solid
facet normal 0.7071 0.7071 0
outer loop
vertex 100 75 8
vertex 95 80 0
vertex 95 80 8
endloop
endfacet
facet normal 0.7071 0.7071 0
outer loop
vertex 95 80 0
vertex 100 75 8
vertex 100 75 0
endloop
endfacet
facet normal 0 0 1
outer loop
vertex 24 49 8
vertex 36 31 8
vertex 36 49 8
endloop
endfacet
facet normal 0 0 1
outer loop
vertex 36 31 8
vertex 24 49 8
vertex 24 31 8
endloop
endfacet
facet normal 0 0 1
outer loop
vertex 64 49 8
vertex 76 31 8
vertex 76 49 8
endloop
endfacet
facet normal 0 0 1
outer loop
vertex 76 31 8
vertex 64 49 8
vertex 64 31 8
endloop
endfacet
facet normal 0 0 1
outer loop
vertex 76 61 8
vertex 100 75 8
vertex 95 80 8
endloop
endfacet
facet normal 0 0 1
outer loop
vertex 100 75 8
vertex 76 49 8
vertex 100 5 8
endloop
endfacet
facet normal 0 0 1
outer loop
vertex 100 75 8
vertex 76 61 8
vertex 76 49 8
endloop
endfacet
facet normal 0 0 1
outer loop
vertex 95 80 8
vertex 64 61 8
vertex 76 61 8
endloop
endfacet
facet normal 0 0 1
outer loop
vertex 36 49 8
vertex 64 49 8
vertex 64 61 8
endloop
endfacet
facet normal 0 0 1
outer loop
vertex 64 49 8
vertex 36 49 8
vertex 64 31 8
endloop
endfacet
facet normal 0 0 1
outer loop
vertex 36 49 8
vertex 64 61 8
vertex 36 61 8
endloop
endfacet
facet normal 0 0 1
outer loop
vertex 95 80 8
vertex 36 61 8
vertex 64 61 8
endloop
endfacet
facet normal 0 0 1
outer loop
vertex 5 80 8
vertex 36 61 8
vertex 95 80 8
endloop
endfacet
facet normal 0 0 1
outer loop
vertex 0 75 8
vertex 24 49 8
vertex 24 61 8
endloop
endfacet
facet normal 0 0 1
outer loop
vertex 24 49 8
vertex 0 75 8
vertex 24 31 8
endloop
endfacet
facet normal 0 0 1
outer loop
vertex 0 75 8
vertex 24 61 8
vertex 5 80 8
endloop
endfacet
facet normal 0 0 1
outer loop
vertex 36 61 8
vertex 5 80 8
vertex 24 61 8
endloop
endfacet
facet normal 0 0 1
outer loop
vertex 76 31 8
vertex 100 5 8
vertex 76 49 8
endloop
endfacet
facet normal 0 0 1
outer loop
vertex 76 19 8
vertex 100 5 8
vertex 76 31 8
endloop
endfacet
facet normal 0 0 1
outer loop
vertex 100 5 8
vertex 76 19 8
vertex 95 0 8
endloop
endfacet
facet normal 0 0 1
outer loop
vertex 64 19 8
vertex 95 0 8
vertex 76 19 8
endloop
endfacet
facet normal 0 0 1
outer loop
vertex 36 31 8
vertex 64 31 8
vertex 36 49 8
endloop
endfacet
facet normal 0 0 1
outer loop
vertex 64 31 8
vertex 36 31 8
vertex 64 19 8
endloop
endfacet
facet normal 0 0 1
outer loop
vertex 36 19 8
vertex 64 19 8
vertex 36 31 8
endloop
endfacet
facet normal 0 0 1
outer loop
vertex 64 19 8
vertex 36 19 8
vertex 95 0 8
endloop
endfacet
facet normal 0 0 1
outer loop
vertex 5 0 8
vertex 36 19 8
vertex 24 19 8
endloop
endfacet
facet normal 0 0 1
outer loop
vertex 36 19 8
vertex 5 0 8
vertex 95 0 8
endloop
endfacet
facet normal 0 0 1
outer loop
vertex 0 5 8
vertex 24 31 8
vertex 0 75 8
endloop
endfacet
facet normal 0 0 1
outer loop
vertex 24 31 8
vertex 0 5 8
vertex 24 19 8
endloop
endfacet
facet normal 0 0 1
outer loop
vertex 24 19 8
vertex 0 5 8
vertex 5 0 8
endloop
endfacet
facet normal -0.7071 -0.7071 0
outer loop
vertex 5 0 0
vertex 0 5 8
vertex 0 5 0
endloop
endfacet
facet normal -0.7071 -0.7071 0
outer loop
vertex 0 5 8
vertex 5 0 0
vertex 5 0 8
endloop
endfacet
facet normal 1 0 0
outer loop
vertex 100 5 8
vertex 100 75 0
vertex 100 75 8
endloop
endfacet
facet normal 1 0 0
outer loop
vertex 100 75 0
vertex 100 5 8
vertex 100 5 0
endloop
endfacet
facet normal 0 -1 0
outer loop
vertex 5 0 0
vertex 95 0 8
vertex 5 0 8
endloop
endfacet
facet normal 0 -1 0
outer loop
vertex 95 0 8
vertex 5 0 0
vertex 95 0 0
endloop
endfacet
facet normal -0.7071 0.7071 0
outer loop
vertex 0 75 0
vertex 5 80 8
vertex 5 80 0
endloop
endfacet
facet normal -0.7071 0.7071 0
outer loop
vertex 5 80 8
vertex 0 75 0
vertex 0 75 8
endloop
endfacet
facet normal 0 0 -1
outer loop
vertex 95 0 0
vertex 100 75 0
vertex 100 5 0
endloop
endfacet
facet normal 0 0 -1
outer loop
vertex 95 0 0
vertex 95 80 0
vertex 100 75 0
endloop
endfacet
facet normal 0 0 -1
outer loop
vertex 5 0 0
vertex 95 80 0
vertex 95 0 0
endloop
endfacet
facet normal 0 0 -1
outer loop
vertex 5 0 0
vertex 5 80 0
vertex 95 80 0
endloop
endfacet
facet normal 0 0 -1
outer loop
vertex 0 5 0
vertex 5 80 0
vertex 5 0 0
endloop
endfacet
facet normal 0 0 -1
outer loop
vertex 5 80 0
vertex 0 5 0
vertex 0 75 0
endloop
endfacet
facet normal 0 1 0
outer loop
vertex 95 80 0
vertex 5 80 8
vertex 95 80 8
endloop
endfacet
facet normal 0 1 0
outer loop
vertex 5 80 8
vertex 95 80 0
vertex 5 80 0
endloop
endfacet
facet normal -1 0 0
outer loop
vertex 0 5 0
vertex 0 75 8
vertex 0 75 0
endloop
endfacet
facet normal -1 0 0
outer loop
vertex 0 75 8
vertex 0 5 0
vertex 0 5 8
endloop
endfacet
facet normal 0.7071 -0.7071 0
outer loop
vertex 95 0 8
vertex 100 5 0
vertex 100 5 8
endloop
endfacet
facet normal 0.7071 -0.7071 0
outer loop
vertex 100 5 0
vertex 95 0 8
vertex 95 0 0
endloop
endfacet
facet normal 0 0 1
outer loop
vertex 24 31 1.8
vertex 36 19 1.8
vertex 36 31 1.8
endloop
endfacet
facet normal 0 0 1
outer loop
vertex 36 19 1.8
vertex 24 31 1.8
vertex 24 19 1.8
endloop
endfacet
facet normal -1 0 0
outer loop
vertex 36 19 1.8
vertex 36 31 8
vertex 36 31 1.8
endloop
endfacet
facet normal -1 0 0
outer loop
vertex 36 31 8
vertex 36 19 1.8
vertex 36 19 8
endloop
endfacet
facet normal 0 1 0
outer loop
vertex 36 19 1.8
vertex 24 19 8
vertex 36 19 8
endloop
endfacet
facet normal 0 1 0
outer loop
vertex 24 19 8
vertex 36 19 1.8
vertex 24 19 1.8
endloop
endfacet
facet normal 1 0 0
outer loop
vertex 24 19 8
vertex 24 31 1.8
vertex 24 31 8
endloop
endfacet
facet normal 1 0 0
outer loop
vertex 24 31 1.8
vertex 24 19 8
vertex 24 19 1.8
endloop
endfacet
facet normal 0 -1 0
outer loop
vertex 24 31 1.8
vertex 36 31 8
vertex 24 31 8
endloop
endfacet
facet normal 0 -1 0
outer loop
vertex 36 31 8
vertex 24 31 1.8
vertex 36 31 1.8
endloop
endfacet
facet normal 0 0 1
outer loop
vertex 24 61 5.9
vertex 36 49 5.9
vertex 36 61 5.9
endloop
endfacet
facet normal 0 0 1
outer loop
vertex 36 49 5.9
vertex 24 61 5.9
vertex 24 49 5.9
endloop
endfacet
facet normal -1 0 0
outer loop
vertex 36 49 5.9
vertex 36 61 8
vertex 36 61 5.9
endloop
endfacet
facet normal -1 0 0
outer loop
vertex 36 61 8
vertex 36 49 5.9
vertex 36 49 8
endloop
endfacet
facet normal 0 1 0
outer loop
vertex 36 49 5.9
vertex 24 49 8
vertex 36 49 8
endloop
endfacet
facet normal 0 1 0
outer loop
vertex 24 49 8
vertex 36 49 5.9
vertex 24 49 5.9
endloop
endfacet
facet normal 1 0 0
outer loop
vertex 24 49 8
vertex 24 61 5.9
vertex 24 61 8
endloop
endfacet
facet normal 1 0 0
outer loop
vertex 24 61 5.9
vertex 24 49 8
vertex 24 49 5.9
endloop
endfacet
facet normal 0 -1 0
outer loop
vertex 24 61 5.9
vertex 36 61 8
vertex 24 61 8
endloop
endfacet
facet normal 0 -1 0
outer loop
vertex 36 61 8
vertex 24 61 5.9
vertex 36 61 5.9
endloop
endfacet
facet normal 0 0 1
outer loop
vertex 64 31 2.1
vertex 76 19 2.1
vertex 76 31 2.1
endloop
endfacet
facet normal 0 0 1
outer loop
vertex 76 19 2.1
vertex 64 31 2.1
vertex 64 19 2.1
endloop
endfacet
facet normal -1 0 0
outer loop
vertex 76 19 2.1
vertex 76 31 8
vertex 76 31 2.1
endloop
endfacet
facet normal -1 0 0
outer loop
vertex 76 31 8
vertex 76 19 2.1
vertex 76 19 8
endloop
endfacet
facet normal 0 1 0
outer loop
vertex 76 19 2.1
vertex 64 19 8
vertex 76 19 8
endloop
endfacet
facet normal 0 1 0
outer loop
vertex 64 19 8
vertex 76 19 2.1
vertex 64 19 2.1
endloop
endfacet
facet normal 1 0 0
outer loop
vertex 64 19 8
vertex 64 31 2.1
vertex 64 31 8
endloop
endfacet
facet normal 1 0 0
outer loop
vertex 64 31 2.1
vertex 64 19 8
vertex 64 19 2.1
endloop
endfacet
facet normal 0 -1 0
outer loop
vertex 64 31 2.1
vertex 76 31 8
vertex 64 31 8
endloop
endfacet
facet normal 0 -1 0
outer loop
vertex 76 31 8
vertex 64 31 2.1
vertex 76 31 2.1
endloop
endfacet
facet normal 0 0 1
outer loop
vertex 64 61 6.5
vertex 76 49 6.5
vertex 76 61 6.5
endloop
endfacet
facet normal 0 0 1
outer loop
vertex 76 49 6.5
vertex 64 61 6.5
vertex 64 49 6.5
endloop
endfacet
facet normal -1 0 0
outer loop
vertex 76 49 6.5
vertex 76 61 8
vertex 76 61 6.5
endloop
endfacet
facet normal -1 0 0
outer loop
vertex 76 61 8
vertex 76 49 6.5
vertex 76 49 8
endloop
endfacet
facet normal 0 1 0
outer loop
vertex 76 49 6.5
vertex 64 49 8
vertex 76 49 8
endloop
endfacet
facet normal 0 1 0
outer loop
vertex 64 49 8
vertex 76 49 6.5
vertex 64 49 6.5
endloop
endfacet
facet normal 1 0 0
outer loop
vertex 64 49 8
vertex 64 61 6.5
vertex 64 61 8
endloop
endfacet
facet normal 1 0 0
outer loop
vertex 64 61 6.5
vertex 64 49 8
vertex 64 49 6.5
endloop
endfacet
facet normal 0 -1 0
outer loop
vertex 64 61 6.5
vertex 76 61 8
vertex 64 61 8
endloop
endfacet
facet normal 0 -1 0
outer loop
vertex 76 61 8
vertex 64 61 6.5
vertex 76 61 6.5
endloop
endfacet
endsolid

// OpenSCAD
$fn = 32;

// ----------------------------------------------------------------------
// Windowed plate: 4 voids, 100 x 80 x 8 mm
// ----------------------------------------------------------------------

// --- parameters (mm) ---
plate_l = 100;            // plate length, X
plate_w = 80;             // plate width, Y
plate_t = 8;              // plate thickness, Z
edge_margin = 10;         // wall from the plate edge to any window
win_l = 12;               // pocket length
win_w = 12;               // pocket width
pitch_x = 40;             // grid pitch along X
pitch_y = 30;             // grid pitch along Y
depth_1 = 6.2;            // depth of void 1 (full thickness = through)
depth_2 = 2.1;            // depth of void 2 (full thickness = through)
depth_3 = 5.9;            // depth of void 3 (full thickness = through)
depth_4 = 1.5;            // depth of void 4 (full thickness = through)
corner_c = 5;             // corner chamfer of the plate

profile = [[5, 0], [95, 0], [100, 5], [100, 75], [95, 80], [5, 80], [0, 75], [0, 5]];  // primary outline, 8 points, counter clockwise
void_1 = [[24, 19], [36, 19], [36, 31], [24, 31]];  // pocket at grid node 0,0, 4 points
void_2 = [[24, 49], [36, 49], [36, 61], [24, 61]];  // pocket at grid node 0,1, 4 points
void_3 = [[64, 19], [76, 19], [76, 31], [64, 31]];  // pocket at grid node 1,0, 4 points
void_4 = [[64, 49], [76, 49], [76, 61], [64, 61]];  // pocket at grid node 1,1, 4 points

// --- the one profile operation ---
difference() {
  linear_extrude(height = plate_t) polygon(points = profile);
  translate([0, 0, plate_t - depth_1])
    linear_extrude(height = depth_1 + 1) polygon(points = void_1);
  translate([0, 0, plate_t - depth_2])
    linear_extrude(height = depth_2 + 1) polygon(points = void_2);
  translate([0, 0, plate_t - depth_3])
    linear_extrude(height = depth_3 + 1) polygon(points = void_3);
  translate([0, 0, plate_t - depth_4])
    linear_extrude(height = depth_4 + 1) polygon(points = void_4);
}
